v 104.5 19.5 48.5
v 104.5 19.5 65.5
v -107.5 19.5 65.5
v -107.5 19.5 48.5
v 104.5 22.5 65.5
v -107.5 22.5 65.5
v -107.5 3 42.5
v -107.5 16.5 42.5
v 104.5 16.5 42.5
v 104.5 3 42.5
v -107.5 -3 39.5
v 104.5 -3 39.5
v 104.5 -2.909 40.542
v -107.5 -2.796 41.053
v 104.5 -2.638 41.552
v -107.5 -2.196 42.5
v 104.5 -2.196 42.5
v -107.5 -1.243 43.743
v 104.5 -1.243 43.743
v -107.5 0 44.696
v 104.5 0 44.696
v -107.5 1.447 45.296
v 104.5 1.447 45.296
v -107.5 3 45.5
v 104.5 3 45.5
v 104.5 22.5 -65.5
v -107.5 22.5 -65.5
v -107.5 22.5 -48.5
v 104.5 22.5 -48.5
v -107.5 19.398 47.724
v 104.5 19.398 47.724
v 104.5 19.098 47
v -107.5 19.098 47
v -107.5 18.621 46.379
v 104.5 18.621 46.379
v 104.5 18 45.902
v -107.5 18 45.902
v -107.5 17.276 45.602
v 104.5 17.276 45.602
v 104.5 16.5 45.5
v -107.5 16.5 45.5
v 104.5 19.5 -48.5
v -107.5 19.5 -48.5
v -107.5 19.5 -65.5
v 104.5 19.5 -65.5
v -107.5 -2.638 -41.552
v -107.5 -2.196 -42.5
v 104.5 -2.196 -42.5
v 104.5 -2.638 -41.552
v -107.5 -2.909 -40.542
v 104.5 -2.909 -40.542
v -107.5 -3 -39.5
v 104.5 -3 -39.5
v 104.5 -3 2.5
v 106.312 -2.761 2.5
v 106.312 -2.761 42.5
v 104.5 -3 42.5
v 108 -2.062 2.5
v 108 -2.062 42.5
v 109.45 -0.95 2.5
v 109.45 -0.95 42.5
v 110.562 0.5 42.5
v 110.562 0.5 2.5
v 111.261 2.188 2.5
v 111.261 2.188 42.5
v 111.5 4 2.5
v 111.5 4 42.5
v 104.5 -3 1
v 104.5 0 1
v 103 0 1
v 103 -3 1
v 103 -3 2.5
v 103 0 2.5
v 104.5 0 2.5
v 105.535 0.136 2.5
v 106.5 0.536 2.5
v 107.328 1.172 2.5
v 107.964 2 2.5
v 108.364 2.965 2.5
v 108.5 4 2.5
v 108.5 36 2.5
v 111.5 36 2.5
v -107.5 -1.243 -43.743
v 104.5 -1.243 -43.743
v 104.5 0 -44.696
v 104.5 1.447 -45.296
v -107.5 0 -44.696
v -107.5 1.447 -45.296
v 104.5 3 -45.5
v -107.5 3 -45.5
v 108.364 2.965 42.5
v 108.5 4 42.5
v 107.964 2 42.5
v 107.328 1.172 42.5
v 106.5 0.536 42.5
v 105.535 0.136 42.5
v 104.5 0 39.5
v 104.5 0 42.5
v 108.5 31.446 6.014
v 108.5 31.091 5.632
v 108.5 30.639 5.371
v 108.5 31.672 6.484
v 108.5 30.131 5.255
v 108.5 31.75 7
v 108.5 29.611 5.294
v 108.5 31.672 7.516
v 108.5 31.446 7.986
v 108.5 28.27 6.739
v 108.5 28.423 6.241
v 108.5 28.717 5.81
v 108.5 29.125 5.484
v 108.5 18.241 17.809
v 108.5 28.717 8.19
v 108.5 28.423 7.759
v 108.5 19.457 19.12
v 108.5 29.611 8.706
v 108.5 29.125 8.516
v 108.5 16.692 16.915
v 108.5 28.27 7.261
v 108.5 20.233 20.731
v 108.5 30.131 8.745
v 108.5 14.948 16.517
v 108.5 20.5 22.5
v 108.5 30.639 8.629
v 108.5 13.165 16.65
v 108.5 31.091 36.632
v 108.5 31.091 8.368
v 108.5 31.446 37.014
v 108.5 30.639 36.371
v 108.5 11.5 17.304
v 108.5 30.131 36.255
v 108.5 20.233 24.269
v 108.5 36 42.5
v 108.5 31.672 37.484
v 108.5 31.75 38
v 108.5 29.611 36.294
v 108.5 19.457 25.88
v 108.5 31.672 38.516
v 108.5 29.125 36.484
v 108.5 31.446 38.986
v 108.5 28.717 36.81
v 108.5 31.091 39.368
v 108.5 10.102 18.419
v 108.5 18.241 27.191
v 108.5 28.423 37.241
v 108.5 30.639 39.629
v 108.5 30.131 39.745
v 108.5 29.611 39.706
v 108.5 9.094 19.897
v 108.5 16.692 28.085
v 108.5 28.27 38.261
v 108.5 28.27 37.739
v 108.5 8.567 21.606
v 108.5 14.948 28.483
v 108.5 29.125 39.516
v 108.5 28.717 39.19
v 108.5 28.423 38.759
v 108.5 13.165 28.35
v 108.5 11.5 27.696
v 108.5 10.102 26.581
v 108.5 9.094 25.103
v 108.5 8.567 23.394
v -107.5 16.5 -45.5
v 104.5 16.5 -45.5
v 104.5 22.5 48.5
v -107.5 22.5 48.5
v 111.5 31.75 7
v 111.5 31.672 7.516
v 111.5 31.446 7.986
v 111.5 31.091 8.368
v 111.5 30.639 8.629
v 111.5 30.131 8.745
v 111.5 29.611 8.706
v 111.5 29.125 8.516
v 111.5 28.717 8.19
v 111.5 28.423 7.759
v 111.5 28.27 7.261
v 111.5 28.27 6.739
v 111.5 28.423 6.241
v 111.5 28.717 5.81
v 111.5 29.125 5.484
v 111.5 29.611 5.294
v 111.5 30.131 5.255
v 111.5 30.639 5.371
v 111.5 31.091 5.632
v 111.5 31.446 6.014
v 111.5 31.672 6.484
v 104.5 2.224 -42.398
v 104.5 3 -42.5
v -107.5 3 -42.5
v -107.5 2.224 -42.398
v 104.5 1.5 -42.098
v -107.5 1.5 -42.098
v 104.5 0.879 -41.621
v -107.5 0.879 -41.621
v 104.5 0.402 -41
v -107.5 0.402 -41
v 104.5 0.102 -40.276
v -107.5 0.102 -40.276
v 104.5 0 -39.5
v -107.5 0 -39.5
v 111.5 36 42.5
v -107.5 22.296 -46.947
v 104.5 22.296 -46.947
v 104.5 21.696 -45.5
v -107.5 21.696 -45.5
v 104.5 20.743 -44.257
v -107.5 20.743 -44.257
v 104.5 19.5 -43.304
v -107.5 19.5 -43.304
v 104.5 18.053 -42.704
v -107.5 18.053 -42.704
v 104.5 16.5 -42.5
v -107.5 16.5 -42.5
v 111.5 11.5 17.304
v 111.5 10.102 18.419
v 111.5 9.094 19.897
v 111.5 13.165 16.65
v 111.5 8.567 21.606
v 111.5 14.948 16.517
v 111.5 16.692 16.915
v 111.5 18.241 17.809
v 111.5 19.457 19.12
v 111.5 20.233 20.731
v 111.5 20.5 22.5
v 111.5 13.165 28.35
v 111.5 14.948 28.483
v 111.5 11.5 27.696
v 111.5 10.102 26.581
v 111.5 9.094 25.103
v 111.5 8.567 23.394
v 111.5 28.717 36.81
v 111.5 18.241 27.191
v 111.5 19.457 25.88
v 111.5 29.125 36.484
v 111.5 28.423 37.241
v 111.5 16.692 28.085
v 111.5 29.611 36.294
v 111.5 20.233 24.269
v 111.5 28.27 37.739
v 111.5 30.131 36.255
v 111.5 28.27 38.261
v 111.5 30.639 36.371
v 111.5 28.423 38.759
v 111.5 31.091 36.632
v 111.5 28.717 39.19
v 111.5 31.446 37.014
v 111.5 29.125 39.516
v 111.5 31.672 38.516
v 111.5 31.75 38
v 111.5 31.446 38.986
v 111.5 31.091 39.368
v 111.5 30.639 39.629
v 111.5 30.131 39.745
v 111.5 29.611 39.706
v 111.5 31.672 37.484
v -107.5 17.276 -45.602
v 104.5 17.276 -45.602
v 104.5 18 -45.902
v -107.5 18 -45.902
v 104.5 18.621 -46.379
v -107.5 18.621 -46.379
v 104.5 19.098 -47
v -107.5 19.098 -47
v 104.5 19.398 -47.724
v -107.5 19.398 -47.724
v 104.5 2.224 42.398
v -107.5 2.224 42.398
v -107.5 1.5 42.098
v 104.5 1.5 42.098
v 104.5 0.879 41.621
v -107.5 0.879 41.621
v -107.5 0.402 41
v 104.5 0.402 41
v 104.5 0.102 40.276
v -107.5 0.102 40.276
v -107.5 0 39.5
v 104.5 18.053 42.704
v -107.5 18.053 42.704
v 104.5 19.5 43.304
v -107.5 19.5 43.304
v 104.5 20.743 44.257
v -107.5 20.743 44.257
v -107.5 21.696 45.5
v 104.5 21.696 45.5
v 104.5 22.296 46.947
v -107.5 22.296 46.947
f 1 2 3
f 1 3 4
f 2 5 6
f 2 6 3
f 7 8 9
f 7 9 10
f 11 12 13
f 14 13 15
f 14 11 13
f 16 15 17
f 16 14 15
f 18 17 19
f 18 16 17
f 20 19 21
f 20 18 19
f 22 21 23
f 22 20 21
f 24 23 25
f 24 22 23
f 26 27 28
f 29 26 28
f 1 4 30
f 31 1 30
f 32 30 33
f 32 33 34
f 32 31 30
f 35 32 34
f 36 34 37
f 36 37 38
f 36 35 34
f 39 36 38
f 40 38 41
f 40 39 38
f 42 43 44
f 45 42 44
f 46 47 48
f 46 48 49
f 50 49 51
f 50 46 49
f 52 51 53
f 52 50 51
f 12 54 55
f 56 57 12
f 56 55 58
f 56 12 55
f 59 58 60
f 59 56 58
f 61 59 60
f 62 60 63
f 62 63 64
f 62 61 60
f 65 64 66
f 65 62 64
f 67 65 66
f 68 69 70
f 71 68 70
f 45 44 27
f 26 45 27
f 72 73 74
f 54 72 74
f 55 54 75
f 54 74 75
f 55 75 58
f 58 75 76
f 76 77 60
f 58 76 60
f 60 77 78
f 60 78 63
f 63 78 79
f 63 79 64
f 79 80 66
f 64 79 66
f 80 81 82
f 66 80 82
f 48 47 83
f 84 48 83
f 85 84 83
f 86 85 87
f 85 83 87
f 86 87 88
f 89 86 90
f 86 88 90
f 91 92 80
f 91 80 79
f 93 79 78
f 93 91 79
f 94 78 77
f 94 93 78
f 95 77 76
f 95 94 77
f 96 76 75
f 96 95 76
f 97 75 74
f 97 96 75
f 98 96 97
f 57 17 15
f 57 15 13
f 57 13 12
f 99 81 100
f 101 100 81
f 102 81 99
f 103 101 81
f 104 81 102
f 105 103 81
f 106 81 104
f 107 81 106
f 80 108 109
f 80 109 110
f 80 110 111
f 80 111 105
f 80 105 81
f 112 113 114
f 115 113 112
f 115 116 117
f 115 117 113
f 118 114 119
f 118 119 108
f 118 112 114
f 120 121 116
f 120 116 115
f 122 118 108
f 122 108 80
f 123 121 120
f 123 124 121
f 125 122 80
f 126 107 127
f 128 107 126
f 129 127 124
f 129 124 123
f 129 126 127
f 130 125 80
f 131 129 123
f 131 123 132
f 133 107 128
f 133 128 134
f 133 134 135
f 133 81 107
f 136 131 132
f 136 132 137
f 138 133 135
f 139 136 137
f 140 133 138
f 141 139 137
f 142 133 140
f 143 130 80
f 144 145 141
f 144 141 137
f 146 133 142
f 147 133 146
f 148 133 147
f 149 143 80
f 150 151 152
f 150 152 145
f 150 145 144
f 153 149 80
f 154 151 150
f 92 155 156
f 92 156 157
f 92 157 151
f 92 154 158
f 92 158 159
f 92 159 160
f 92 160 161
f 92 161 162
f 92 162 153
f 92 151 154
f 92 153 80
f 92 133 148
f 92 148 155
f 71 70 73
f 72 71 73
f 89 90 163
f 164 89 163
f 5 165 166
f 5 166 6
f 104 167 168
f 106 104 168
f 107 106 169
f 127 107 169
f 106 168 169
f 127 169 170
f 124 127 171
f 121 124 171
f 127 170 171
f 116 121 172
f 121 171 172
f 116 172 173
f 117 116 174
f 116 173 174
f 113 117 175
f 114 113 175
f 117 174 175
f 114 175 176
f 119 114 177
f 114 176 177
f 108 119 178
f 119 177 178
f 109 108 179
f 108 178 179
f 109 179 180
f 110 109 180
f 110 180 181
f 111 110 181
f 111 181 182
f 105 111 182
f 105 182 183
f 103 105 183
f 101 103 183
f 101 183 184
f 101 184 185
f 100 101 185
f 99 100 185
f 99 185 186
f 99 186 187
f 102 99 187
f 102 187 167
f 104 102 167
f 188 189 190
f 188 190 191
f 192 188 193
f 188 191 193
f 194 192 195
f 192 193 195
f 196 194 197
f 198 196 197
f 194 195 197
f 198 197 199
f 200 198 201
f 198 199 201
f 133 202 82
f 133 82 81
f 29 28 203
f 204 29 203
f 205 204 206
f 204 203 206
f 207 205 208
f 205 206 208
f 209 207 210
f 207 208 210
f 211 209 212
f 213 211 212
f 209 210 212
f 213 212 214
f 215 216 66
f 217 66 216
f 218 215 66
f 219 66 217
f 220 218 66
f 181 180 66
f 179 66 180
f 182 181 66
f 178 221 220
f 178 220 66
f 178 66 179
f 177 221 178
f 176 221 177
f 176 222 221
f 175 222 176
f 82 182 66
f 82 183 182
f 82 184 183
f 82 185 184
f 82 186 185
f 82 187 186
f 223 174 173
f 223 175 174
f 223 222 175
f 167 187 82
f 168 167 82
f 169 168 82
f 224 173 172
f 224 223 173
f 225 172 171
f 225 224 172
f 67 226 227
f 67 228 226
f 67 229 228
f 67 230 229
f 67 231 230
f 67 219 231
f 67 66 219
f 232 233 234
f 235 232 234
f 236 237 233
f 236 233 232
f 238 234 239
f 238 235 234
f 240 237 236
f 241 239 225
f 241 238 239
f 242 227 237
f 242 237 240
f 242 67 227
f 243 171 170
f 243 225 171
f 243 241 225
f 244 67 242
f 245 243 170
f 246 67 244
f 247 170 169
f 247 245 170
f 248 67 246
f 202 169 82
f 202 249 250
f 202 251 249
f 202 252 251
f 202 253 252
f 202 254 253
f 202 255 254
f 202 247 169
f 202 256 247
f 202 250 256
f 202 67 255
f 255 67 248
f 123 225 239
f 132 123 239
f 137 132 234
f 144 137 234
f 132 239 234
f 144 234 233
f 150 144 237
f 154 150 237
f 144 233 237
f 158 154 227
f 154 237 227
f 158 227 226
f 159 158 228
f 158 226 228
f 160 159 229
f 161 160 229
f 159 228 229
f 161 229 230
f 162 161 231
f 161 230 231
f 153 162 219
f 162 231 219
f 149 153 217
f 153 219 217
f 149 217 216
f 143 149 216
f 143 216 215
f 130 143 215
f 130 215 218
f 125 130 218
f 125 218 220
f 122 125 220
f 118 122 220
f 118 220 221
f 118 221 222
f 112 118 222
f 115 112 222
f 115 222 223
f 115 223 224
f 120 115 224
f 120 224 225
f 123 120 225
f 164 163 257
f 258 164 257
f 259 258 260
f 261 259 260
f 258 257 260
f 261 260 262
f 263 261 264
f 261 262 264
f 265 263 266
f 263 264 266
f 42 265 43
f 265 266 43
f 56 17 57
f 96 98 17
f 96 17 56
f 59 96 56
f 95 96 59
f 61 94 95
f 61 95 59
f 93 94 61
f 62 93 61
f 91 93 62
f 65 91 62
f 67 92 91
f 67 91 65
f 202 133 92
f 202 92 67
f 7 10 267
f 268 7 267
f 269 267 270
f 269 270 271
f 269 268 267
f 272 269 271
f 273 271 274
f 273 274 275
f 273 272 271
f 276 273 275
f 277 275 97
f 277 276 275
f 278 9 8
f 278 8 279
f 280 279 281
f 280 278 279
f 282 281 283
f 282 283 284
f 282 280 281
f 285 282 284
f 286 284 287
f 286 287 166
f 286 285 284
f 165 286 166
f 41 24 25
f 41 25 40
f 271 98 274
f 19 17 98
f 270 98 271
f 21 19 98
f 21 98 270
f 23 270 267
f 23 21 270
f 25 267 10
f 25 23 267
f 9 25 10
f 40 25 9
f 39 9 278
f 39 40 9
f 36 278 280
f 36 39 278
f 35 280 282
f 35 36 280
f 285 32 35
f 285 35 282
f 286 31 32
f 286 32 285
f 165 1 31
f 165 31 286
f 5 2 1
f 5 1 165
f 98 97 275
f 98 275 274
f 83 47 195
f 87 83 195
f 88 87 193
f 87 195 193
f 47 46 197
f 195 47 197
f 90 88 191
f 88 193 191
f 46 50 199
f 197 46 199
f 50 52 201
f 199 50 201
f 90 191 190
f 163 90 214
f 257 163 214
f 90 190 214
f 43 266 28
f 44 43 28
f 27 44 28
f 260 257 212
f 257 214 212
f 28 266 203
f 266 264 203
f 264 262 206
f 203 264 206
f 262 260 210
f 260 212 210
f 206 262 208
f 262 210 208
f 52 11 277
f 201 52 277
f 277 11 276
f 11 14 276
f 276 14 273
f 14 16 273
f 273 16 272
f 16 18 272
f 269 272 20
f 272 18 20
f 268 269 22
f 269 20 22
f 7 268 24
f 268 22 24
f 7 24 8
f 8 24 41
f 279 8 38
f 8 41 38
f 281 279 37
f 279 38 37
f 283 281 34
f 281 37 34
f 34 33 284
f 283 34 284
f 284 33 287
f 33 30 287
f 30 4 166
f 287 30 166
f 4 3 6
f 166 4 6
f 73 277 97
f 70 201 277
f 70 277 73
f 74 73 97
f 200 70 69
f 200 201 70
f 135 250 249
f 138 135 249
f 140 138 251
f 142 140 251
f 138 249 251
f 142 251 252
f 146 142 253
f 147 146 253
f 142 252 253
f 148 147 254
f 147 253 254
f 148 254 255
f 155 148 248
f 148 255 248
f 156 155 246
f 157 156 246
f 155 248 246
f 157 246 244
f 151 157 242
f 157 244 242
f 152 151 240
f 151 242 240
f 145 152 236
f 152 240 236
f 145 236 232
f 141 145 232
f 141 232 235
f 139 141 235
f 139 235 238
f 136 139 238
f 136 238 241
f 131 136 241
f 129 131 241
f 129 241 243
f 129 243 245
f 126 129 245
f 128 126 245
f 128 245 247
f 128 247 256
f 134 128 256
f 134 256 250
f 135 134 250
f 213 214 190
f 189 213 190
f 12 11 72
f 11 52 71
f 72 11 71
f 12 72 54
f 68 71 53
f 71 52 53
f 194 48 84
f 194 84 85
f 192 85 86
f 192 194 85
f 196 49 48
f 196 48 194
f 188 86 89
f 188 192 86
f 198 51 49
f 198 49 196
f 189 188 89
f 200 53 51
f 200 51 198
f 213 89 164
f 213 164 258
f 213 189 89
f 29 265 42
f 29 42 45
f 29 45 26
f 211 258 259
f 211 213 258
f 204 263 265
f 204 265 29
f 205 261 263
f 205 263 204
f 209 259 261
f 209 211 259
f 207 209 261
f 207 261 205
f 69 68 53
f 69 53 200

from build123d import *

# Parameters (mm, degrees)
BASE_FLANGE1_DEPTH            = 3
EDGE_FLANGE1_STRIP_W          = 20
EDGE_FLANGE1_STRIP_H          = 3
EDGE_FLANGE1_STRIP_CUT_DEPTH  = 40
EDGE_FLANGE1_RELIEF_W         = 21.5
EDGE_FLANGE1_RELIEF_H         = 1.5
EDGE_FLANGE1_RELIEF_CUT_DEPTH = 3
EDGE_FLANGE1_DEPTH            = 40
SKETCH10_R                    = 1.75
SKETCH10_R_2                  = 6
CUT_EXTRUDE1_DEPTH            = 226.971790275
EDGE_FLANGE2_STRIP_W          = 18
EDGE_FLANGE2_STRIP_H          = 3
EDGE_FLANGE2_STRIP_CUT_DEPTH  = 212
EDGE_FLANGE2_DEPTH            = 212
EDGE_FLANGE3_STRIP_W          = 18
EDGE_FLANGE3_STRIP_H          = 3
EDGE_FLANGE3_STRIP_CUT_DEPTH  = 212
EDGE_FLANGE3_DEPTH            = 212
MIRROR1_START                 = -107.5
MIRROR1_DEPTH                 = 213.5
MIRROR1_START_2               = 104.5
MIRROR1_2_DEPTH               = 1.5
MIRROR1_3_DEPTH               = 212
CUT_EXTRUDE2_DEPTH            = 10


# Read off the part's stored shape, not the designer's step: Mirror1
# Sheet-metal steps are written as plain solids
with BuildPart() as part:
    # Sketch1 → Base-Flange1 (new body)
    with BuildSketch(Plane(origin=(0, 0, 0), x_dir=(1, 0, 0), z_dir=(0, 1, 0))):
        Polygon((-107.5, -42.5), (108.5, -42.5), (108.5, -2.5), (107.5, -2.5), (107.5, 42.5), (-107.5, 42.5), align=None)
    extrude(amount=-BASE_FLANGE1_DEPTH)

    # Edge-Flange1 strip (across the edge) → Edge-Flange1 strip cut (cut)
    with BuildSketch(Plane(origin=(108.5, 0, 42.5), x_dir=(-1, 0, 0), z_dir=(0, 0, -1))):
        with Locations((-6, -1.5)):
            Rectangle(EDGE_FLANGE1_STRIP_W, EDGE_FLANGE1_STRIP_H)
    extrude(amount=EDGE_FLANGE1_STRIP_CUT_DEPTH, mode=Mode.SUBTRACT)

    # Edge-Flange1 relief (on the sheet) → Edge-Flange1 relief cut (cut)
    with BuildSketch(Plane(origin=(104.5, 0, 42.5), x_dir=(-1, 0, 0), z_dir=(0, 1, 0))):
        with Locations((-9.25, -40.75)):
            Rectangle(EDGE_FLANGE1_RELIEF_W, EDGE_FLANGE1_RELIEF_H)
    extrude(amount=-EDGE_FLANGE1_RELIEF_CUT_DEPTH, mode=Mode.SUBTRACT)

    # Edge-Flange1 section (across the edge) → Edge-Flange1 (add)
    with BuildSketch(Plane(origin=(108.5, 0, 42.5), x_dir=(-1, 0, 0), z_dir=(0, 0, -1))):
        with BuildLine():
            Line((-3, 4), (-3, 36))
            Line((-3, 36), (0, 36))
            Line((0, 36), (0, 4))
            ThreePointArc((0, 4), (1.171572875, 1.171572875), (4, 0))
            Line((4, 0), (4, -3))
            ThreePointArc((4, -3), (-0.949747468, -0.949747468), (-3, 4))
        make_face()
    extrude(amount=EDGE_FLANGE1_DEPTH)

    # Sketch10 → Cut-Extrude1 (cut, through all)
    with BuildSketch(Plane(origin=(111.5, 0, 0), x_dir=(0, 0, -1), z_dir=(1, 0, 0))):
        with Locations(Location((-38, 30, 0), (0, 0, 90))):
            Circle(SKETCH10_R)
        with Locations(Location((-7, 30, 0), (0, 0, 90))):
            Circle(SKETCH10_R)
        with Locations(Location((-22.5, 14.5, 0), (0, 0, 90))):
            Circle(SKETCH10_R_2)
    extrude(amount=-CUT_EXTRUDE1_DEPTH, mode=Mode.SUBTRACT)

    # Edge-Flange2 strip (across the edge) → Edge-Flange2 strip cut (cut)
    with BuildSketch(Plane(origin=(-107.5, 0, 42.5), x_dir=(0, 0, -1), z_dir=(1, 0, 0))):
        with Locations((-6, -1.5)):
            Rectangle(EDGE_FLANGE2_STRIP_W, EDGE_FLANGE2_STRIP_H)
    extrude(amount=EDGE_FLANGE2_STRIP_CUT_DEPTH, mode=Mode.SUBTRACT)

    # Edge-Flange2 section (across the edge) → Edge-Flange2 (add)
    with BuildSketch(Plane(origin=(-107.5, 0, 42.5), x_dir=(0, 0, -1), z_dir=(1, 0, 0))):
        with BuildLine():
            Line((-3, 3), (-3, 19.5))
            Line((-3, 19.5), (0, 19.5))
            Line((0, 19.5), (0, 3))
            ThreePointArc((0, 3), (0.878679656, 0.878679656), (3, 0))
            Line((3, 0), (3, -3))
            ThreePointArc((3, -3), (-1.242640687, -1.242640687), (-3, 3))
        make_face()
    extrude(amount=EDGE_FLANGE2_DEPTH)

    # Edge-Flange3 strip (across the edge) → Edge-Flange3 strip cut (cut)
    with BuildSketch(Plane(origin=(104.5, 19.5, 45.5), x_dir=(0, -1, 0), z_dir=(-1, 0, 0))):
        with Locations((-6, -1.5)):
            Rectangle(EDGE_FLANGE3_STRIP_W, EDGE_FLANGE3_STRIP_H)
    extrude(amount=EDGE_FLANGE3_STRIP_CUT_DEPTH, mode=Mode.SUBTRACT)

    # Edge-Flange3 section (across the edge) → Edge-Flange3 (add)
    with BuildSketch(Plane(origin=(104.5, 19.5, 45.5), x_dir=(0, -1, 0), z_dir=(-1, 0, 0))):
        with BuildLine():
            Line((-3, 3), (-3, 20))
            Line((-3, 20), (0, 20))
            Line((0, 20), (0, 3))
            ThreePointArc((0, 3), (0.878679656, 0.878679656), (3, 0))
            Line((3, 0), (3, -3))
            ThreePointArc((3, -3), (-1.242640687, -1.242640687), (-3, 3))
        make_face()
    extrude(amount=EDGE_FLANGE3_DEPTH)

    # Mirror1 outline → Mirror1 (cut)
    with BuildSketch(Plane.YZ.offset(MIRROR1_START)):
        with BuildLine():
            Line((-3, -42.5), (-2.196152423, -42.5))
            ThreePointArc((-2.196152423, -42.5), (-2.795554958, -41.052914271), (-3, -39.5))
            Line((-3, -39.5), (-3, -42.5))
        make_face()
    extrude(amount=MIRROR1_DEPTH, mode=Mode.SUBTRACT)

    # Mirror1 2 outline → Mirror1 2 (cut)
    with BuildSketch(Plane.YZ.offset(MIRROR1_START_2)):
        with BuildLine():
            ThreePointArc((-3, -39.5), (-2.795554958, -41.052914271), (-2.196152423, -42.5))
            Line((-2.196152423, -42.5), (0, -42.5))
            Line((0, -42.5), (0, -38))
            Line((0, -38), (-3, -38))
            Line((-3, -38), (-3, -39.5))
        make_face()
    extrude(amount=MIRROR1_2_DEPTH, mode=Mode.SUBTRACT)

    # Mirror1 3 outline → Mirror1 3 (add)
    with BuildSketch(Plane.YZ.offset(MIRROR1_START)):
        with BuildLine():
            Line((3, -45.5), (16.5, -45.5))
            ThreePointArc((16.5, -45.5), (18.621320344, -46.378679656), (19.5, -48.5))
            Line((19.5, -48.5), (19.5, -65.5))
            Line((19.5, -65.5), (22.5, -65.5))
            Line((22.5, -65.5), (22.5, -48.5))
            ThreePointArc((22.5, -48.5), (20.742640687, -44.257359313), (16.5, -42.5))
            Line((16.5, -42.5), (3, -42.5))
            ThreePointArc((3, -42.5), (0.878679656, -41.621320344), (0, -39.5))
            Line((0, -39.5), (0, -42.5))
            Line((0, -42.5), (-2.196152423, -42.5))
            ThreePointArc((-2.196152423, -42.5), (0, -44.696152423), (3, -45.5))
        make_face()
    extrude(amount=MIRROR1_3_DEPTH)

    # Sketch19 → Cut-Extrude2 (cut)
    with BuildSketch(Plane(origin=(0, 0, 0), x_dir=(1, 0, 0), z_dir=(0, 1, 0))):
        Polygon((107.5, -1), (107.5, 42.5), (106, 42.5), (104.5, 38), (104.5, -1), align=None)
    extrude(amount=-CUT_EXTRUDE2_DEPTH, mode=Mode.SUBTRACT)


solid = part.part
